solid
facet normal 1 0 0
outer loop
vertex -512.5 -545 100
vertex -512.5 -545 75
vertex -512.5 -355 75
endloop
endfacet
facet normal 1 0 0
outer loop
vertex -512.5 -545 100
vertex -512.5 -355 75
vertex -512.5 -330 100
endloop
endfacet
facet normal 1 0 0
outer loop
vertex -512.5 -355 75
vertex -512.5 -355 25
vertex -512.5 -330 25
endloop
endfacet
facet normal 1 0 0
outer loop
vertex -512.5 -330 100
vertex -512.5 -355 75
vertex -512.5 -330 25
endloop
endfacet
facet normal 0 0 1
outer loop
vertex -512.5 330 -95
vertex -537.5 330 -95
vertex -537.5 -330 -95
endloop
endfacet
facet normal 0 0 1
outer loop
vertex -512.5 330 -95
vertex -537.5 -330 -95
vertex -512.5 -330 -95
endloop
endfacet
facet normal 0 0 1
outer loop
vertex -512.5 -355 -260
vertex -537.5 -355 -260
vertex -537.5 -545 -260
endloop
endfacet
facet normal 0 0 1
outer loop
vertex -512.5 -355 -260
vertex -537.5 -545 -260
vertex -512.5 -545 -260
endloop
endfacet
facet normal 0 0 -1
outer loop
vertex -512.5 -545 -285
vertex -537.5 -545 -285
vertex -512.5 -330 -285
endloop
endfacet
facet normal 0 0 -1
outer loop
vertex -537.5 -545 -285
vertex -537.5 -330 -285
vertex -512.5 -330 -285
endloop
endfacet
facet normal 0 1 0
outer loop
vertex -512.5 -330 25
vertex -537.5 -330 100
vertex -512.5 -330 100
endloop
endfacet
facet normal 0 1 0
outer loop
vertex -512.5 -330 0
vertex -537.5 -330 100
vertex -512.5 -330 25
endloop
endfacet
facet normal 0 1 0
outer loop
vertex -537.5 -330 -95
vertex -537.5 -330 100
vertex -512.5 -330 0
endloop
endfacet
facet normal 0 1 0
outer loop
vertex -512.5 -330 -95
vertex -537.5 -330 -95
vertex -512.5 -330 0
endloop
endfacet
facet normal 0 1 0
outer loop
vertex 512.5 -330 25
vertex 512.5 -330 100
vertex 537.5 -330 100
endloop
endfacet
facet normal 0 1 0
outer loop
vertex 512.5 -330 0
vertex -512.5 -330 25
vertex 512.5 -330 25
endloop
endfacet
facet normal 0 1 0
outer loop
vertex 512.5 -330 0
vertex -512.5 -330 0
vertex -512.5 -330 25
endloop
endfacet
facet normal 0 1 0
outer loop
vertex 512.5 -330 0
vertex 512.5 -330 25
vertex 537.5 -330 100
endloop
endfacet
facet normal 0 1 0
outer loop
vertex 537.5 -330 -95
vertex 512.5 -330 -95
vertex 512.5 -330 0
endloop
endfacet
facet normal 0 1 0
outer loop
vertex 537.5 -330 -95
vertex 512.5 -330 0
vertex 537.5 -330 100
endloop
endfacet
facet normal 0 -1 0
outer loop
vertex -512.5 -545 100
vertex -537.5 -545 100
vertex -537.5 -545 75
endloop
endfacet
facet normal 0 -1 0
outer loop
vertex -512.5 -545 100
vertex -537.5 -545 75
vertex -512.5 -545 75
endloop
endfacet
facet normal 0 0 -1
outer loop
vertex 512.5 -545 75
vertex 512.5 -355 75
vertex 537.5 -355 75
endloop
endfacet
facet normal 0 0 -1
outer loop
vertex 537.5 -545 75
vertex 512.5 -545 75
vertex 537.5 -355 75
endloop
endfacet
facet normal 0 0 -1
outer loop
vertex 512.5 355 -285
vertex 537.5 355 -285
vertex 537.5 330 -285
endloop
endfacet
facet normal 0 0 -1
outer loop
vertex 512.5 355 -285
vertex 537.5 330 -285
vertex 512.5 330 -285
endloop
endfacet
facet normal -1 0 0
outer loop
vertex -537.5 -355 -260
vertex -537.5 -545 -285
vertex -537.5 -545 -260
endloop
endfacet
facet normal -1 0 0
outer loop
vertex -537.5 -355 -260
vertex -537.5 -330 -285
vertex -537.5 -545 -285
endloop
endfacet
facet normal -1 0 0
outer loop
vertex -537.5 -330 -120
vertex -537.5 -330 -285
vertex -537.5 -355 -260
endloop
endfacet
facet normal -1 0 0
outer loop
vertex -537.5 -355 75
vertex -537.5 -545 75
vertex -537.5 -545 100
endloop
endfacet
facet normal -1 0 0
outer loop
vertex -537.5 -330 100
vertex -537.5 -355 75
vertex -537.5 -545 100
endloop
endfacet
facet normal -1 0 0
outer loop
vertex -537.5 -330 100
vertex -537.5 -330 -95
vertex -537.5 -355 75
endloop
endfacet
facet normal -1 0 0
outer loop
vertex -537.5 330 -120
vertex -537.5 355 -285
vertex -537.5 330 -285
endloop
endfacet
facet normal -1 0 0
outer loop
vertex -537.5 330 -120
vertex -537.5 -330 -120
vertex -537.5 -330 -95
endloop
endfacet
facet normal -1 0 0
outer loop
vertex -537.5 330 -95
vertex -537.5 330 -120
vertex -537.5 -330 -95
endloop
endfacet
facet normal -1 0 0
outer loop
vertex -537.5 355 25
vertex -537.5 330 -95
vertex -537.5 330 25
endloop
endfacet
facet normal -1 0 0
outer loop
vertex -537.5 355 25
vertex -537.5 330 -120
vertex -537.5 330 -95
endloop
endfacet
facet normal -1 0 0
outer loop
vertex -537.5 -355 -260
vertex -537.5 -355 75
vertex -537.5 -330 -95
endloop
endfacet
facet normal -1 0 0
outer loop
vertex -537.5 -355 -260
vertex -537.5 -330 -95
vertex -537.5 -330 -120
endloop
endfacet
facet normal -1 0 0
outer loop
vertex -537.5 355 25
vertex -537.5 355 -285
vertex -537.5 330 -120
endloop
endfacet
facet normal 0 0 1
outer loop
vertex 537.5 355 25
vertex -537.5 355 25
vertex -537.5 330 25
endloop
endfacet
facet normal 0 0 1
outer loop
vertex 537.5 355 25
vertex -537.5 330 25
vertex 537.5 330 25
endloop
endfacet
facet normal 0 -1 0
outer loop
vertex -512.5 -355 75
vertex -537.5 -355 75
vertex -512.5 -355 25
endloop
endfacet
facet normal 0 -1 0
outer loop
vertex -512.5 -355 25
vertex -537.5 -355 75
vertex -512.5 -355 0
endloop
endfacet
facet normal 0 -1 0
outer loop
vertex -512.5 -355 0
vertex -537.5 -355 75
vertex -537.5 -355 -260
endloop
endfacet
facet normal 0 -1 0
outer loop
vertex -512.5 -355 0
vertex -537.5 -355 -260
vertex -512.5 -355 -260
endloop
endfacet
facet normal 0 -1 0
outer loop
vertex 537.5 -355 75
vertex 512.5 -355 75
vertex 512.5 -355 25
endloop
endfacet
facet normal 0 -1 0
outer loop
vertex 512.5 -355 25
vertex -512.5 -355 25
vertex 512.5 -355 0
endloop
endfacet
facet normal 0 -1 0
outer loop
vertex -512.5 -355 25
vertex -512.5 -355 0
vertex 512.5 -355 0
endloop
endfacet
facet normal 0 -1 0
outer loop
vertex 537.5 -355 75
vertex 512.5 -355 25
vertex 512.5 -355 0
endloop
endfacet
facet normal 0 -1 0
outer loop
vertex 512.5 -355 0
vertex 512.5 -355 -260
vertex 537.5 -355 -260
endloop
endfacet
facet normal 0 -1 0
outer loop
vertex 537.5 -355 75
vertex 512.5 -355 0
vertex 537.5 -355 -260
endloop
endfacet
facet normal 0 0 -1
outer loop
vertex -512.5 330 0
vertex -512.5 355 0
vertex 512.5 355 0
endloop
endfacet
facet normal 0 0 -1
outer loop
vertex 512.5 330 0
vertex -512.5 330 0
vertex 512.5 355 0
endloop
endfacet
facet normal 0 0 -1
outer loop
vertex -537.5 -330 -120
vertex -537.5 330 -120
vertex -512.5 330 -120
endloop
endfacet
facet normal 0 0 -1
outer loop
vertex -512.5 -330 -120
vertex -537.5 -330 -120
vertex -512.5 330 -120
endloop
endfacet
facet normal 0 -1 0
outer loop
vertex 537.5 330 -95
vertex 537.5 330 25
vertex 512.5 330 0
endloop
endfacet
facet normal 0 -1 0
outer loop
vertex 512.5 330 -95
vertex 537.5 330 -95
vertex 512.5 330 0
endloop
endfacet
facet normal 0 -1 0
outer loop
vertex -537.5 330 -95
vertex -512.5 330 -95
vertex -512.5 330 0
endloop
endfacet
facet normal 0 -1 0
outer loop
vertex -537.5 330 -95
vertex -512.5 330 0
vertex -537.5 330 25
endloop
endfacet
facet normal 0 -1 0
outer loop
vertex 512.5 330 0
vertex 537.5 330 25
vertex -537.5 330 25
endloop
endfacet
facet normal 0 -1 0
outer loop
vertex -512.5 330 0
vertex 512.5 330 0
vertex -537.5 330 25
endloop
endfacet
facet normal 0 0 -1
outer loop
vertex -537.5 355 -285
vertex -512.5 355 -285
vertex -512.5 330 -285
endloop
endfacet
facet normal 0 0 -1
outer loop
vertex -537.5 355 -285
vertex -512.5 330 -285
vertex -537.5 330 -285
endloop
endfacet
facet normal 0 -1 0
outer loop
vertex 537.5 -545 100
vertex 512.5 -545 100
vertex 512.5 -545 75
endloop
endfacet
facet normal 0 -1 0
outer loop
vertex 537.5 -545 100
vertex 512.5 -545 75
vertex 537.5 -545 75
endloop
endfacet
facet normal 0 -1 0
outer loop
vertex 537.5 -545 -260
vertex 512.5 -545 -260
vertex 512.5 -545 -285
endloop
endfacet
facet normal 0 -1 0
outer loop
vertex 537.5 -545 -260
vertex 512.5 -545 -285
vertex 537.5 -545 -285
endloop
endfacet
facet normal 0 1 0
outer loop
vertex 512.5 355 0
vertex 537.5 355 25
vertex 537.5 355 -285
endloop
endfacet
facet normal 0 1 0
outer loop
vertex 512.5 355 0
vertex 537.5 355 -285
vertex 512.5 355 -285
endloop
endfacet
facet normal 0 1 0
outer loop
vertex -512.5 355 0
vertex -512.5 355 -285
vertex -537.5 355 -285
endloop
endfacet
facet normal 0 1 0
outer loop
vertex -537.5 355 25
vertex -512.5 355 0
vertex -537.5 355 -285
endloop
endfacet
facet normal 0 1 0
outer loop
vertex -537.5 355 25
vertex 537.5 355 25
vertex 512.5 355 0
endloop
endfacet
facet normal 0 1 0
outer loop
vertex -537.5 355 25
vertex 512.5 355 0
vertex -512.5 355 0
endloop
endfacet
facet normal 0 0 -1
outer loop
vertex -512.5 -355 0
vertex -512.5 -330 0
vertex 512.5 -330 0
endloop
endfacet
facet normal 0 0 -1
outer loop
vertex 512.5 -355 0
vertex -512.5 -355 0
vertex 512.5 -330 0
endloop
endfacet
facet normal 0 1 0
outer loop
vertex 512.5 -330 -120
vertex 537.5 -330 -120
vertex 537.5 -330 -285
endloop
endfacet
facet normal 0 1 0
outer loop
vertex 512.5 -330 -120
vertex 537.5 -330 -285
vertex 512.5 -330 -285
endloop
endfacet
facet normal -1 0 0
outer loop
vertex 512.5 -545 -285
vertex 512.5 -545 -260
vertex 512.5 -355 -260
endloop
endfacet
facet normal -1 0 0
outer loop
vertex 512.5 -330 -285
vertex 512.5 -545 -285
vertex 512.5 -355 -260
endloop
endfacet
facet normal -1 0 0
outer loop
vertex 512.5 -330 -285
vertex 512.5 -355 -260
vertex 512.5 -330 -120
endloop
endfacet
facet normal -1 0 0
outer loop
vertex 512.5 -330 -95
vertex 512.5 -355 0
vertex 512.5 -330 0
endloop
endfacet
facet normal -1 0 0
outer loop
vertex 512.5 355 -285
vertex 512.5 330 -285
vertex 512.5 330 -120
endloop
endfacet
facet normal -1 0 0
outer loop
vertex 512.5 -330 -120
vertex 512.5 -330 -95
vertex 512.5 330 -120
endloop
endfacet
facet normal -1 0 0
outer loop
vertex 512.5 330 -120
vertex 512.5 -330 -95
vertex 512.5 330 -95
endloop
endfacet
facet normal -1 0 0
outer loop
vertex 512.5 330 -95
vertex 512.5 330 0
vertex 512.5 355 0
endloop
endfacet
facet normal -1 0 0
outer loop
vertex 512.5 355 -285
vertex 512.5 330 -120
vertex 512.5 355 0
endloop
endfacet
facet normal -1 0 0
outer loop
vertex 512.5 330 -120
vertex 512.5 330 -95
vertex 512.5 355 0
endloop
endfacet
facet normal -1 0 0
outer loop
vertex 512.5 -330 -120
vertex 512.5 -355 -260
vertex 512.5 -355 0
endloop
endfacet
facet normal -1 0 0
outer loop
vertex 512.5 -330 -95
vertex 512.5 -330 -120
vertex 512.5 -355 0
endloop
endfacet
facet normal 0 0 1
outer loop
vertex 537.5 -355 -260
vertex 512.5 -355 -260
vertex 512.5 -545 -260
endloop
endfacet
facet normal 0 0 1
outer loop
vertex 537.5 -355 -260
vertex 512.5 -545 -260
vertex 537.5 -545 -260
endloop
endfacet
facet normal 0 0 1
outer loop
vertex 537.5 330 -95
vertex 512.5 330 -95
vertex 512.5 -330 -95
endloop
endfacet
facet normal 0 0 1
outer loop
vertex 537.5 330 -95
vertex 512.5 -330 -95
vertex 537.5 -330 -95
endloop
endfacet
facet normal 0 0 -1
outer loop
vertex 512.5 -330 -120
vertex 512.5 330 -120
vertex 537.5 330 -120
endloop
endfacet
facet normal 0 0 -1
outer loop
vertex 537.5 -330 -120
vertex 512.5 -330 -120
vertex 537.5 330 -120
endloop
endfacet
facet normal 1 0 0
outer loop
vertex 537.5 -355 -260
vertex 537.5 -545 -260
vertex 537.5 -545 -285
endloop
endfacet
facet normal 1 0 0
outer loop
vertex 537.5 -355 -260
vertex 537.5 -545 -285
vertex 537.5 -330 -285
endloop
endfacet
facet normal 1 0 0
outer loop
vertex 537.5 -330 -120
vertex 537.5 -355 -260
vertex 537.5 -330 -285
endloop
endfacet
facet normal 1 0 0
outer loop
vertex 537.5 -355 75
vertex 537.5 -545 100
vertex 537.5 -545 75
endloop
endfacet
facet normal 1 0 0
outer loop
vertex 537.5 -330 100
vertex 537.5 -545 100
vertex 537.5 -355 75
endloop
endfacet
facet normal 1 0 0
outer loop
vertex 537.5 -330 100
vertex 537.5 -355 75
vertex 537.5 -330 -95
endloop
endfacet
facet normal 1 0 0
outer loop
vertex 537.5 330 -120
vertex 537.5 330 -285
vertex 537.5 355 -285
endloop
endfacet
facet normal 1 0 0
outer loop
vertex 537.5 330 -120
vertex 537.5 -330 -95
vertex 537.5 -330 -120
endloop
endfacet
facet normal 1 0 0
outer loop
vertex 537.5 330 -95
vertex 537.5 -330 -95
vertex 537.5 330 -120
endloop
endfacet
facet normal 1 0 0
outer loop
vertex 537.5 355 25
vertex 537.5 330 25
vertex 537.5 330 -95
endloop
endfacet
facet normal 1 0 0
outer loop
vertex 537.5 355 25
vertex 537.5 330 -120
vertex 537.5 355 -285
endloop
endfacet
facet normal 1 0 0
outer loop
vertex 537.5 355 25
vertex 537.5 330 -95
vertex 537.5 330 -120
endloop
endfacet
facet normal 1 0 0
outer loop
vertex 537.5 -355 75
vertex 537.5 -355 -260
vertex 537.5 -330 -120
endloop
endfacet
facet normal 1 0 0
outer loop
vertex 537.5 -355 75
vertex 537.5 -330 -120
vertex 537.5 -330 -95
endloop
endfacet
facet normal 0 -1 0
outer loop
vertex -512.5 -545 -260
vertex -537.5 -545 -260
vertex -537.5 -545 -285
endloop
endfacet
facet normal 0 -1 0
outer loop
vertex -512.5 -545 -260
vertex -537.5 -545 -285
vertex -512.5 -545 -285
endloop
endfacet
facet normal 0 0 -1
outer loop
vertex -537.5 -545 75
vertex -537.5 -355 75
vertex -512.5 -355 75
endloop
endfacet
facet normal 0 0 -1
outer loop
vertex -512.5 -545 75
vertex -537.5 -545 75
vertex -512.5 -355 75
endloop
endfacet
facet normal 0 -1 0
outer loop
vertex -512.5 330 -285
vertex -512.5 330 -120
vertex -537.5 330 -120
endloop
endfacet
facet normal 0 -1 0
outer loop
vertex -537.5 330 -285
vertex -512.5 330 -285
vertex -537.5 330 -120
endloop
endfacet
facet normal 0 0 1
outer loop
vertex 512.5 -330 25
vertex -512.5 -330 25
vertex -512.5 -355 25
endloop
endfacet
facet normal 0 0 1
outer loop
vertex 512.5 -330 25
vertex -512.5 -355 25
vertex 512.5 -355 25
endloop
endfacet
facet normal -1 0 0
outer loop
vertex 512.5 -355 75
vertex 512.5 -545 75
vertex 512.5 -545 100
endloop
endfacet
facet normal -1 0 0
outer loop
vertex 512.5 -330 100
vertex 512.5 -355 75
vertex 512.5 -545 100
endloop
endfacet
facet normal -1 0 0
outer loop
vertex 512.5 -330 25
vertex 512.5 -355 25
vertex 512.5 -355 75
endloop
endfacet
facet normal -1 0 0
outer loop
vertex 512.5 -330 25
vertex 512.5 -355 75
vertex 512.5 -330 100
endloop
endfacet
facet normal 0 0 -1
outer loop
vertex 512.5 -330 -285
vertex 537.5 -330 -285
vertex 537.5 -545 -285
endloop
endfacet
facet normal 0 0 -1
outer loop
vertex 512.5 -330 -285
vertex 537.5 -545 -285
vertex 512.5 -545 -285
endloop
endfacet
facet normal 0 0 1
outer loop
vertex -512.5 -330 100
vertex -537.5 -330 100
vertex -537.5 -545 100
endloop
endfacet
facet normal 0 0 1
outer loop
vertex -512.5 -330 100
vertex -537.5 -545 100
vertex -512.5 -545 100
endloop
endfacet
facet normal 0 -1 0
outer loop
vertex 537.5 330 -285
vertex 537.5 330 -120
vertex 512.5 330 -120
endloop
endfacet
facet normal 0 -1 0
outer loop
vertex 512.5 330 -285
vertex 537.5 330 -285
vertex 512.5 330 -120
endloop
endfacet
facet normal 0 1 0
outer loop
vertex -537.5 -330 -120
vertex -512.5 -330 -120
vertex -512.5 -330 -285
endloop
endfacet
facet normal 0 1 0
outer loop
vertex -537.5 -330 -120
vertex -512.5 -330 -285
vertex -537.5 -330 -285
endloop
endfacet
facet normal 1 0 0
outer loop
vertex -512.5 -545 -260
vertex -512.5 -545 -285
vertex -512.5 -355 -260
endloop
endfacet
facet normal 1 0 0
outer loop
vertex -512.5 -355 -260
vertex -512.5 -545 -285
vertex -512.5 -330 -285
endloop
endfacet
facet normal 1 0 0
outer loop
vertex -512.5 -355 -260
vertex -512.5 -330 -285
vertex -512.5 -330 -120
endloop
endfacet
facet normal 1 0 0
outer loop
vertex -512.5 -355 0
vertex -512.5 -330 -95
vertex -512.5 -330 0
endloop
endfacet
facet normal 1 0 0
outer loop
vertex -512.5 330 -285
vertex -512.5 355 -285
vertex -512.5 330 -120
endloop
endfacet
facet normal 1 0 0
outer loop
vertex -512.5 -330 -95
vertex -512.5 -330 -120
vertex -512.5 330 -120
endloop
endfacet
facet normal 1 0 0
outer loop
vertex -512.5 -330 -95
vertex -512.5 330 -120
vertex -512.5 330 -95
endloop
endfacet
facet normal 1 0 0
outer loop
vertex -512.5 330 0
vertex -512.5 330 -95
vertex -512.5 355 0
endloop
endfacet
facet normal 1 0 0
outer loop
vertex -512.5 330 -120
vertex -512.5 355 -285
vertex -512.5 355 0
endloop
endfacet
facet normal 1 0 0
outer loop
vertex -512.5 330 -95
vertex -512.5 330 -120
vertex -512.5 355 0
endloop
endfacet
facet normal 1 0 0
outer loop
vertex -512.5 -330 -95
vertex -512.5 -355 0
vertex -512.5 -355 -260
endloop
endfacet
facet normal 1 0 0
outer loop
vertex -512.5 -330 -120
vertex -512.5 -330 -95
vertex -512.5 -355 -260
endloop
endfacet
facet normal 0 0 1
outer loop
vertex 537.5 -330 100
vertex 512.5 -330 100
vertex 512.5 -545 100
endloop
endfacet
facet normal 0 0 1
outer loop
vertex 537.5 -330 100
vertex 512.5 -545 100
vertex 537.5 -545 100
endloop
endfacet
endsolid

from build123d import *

# Parameters (mm, degrees)
SKETCH1_W             = 1075
SKETCH1_H             = 25
BOSS_EXTRUDE1_DEPTH   = 25
BOSS_EXTRUDE1_2_DEPTH = 25
SKETCH2_W             = 25
SKETCH2_H             = 25
BOSS_EXTRUDE2_DEPTH   = 285
BOSS_EXTRUDE3_REACH   = 918.164
SKETCH3_W             = 25
SKETCH3_H             = 25
SKETCH4_W             = 25
SKETCH4_H             = 25
BOSS_EXTRUDE4_DEPTH   = 75
SKETCH5_W             = 25
SKETCH5_H             = 25
BOSS_EXTRUDE5_DEPTH   = 190


with BuildPart() as part:
    # Sketch1 → Boss-Extrude1 (new body)
    with BuildSketch(Plane.XY):
        with Locations((0, -342.5)):
            Rectangle(SKETCH1_W, SKETCH1_H)
    extrude(amount=BOSS_EXTRUDE1_DEPTH)



with BuildPart() as body_2:
    # Sketch1 → Boss-Extrude1 2 (new body)
    with BuildSketch(Plane.XY):
        with Locations((0, 342.5)):
            Rectangle(SKETCH1_W, SKETCH1_H)
    extrude(amount=BOSS_EXTRUDE1_2_DEPTH)


with BuildPart() as part_1:
    add(part.part)

    add(body_2.part)  # Boss-Extrude2 merges body 2
    # Sketch2 → Boss-Extrude2 (add)
    with BuildSketch(Plane(origin=(0, 0, 0), x_dir=(-1, 0, 0), z_dir=(0, 0, -1))):
        with Locations((-525, 342.5)):
            Rectangle(SKETCH2_W, SKETCH2_H)
        with Locations((525, 342.5)):
            Rectangle(SKETCH2_W, SKETCH2_H)
        with Locations((525, -342.5)):
            Rectangle(SKETCH2_W, SKETCH2_H)
        with Locations((-525, -342.5)):
            Rectangle(SKETCH2_W, SKETCH2_H)
    extrude(amount=BOSS_EXTRUDE2_DEPTH)

    # Sketch3 → Boss-Extrude3 (add, up to next)
    with BuildSketch(Plane(origin=(0, -330, 0), x_dir=(1, 0, 0), z_dir=(0, 1, 0)), mode=Mode.PRIVATE) as boss_extrude3_sk1:
        with Locations((-525, 107.5)):
            Rectangle(SKETCH3_W, SKETCH3_H)
    boss_extrude3_tool1 = extrude(boss_extrude3_sk1.sketch, amount=BOSS_EXTRUDE3_REACH, mode=Mode.PRIVATE) - part_1.part
    # Sketch3 → Boss-Extrude3 (add, up to next)
    with BuildSketch(Plane(origin=(0, -330, 0), x_dir=(1, 0, 0), z_dir=(0, 1, 0)), mode=Mode.PRIVATE) as boss_extrude3_sk2:
        with Locations((525, 107.5)):
            Rectangle(SKETCH3_W, SKETCH3_H)
    boss_extrude3_tool2 = extrude(boss_extrude3_sk2.sketch, amount=BOSS_EXTRUDE3_REACH, mode=Mode.PRIVATE) - part_1.part
    add(boss_extrude3_tool1.solids().sort_by_distance((-525, -330, -107.5))[0])
    add(boss_extrude3_tool2.solids().sort_by_distance((525, -330, -107.5))[0])

    # Sketch4 → Boss-Extrude4 (add)
    with BuildSketch(Plane.XY.offset(25)):
        with Locations((-525, -342.5)):
            Rectangle(SKETCH4_W, SKETCH4_H)
        with Locations((525, -342.5)):
            Rectangle(SKETCH4_W, SKETCH4_H)
    extrude(amount=BOSS_EXTRUDE4_DEPTH)

    # Sketch5 → Boss-Extrude5 (add)
    with BuildSketch(Plane.XZ.offset(355)):
        with Locations((-525, -272.5)):
            Rectangle(SKETCH5_W, SKETCH5_H)
        with Locations((-525, 87.5)):
            Rectangle(SKETCH5_W, SKETCH5_H)
        with Locations((525, 87.5)):
            Rectangle(SKETCH5_W, SKETCH5_H)
        with Locations((525, -272.5)):
            Rectangle(SKETCH5_W, SKETCH5_H)
    extrude(amount=BOSS_EXTRUDE5_DEPTH)


solid = part_1.part
